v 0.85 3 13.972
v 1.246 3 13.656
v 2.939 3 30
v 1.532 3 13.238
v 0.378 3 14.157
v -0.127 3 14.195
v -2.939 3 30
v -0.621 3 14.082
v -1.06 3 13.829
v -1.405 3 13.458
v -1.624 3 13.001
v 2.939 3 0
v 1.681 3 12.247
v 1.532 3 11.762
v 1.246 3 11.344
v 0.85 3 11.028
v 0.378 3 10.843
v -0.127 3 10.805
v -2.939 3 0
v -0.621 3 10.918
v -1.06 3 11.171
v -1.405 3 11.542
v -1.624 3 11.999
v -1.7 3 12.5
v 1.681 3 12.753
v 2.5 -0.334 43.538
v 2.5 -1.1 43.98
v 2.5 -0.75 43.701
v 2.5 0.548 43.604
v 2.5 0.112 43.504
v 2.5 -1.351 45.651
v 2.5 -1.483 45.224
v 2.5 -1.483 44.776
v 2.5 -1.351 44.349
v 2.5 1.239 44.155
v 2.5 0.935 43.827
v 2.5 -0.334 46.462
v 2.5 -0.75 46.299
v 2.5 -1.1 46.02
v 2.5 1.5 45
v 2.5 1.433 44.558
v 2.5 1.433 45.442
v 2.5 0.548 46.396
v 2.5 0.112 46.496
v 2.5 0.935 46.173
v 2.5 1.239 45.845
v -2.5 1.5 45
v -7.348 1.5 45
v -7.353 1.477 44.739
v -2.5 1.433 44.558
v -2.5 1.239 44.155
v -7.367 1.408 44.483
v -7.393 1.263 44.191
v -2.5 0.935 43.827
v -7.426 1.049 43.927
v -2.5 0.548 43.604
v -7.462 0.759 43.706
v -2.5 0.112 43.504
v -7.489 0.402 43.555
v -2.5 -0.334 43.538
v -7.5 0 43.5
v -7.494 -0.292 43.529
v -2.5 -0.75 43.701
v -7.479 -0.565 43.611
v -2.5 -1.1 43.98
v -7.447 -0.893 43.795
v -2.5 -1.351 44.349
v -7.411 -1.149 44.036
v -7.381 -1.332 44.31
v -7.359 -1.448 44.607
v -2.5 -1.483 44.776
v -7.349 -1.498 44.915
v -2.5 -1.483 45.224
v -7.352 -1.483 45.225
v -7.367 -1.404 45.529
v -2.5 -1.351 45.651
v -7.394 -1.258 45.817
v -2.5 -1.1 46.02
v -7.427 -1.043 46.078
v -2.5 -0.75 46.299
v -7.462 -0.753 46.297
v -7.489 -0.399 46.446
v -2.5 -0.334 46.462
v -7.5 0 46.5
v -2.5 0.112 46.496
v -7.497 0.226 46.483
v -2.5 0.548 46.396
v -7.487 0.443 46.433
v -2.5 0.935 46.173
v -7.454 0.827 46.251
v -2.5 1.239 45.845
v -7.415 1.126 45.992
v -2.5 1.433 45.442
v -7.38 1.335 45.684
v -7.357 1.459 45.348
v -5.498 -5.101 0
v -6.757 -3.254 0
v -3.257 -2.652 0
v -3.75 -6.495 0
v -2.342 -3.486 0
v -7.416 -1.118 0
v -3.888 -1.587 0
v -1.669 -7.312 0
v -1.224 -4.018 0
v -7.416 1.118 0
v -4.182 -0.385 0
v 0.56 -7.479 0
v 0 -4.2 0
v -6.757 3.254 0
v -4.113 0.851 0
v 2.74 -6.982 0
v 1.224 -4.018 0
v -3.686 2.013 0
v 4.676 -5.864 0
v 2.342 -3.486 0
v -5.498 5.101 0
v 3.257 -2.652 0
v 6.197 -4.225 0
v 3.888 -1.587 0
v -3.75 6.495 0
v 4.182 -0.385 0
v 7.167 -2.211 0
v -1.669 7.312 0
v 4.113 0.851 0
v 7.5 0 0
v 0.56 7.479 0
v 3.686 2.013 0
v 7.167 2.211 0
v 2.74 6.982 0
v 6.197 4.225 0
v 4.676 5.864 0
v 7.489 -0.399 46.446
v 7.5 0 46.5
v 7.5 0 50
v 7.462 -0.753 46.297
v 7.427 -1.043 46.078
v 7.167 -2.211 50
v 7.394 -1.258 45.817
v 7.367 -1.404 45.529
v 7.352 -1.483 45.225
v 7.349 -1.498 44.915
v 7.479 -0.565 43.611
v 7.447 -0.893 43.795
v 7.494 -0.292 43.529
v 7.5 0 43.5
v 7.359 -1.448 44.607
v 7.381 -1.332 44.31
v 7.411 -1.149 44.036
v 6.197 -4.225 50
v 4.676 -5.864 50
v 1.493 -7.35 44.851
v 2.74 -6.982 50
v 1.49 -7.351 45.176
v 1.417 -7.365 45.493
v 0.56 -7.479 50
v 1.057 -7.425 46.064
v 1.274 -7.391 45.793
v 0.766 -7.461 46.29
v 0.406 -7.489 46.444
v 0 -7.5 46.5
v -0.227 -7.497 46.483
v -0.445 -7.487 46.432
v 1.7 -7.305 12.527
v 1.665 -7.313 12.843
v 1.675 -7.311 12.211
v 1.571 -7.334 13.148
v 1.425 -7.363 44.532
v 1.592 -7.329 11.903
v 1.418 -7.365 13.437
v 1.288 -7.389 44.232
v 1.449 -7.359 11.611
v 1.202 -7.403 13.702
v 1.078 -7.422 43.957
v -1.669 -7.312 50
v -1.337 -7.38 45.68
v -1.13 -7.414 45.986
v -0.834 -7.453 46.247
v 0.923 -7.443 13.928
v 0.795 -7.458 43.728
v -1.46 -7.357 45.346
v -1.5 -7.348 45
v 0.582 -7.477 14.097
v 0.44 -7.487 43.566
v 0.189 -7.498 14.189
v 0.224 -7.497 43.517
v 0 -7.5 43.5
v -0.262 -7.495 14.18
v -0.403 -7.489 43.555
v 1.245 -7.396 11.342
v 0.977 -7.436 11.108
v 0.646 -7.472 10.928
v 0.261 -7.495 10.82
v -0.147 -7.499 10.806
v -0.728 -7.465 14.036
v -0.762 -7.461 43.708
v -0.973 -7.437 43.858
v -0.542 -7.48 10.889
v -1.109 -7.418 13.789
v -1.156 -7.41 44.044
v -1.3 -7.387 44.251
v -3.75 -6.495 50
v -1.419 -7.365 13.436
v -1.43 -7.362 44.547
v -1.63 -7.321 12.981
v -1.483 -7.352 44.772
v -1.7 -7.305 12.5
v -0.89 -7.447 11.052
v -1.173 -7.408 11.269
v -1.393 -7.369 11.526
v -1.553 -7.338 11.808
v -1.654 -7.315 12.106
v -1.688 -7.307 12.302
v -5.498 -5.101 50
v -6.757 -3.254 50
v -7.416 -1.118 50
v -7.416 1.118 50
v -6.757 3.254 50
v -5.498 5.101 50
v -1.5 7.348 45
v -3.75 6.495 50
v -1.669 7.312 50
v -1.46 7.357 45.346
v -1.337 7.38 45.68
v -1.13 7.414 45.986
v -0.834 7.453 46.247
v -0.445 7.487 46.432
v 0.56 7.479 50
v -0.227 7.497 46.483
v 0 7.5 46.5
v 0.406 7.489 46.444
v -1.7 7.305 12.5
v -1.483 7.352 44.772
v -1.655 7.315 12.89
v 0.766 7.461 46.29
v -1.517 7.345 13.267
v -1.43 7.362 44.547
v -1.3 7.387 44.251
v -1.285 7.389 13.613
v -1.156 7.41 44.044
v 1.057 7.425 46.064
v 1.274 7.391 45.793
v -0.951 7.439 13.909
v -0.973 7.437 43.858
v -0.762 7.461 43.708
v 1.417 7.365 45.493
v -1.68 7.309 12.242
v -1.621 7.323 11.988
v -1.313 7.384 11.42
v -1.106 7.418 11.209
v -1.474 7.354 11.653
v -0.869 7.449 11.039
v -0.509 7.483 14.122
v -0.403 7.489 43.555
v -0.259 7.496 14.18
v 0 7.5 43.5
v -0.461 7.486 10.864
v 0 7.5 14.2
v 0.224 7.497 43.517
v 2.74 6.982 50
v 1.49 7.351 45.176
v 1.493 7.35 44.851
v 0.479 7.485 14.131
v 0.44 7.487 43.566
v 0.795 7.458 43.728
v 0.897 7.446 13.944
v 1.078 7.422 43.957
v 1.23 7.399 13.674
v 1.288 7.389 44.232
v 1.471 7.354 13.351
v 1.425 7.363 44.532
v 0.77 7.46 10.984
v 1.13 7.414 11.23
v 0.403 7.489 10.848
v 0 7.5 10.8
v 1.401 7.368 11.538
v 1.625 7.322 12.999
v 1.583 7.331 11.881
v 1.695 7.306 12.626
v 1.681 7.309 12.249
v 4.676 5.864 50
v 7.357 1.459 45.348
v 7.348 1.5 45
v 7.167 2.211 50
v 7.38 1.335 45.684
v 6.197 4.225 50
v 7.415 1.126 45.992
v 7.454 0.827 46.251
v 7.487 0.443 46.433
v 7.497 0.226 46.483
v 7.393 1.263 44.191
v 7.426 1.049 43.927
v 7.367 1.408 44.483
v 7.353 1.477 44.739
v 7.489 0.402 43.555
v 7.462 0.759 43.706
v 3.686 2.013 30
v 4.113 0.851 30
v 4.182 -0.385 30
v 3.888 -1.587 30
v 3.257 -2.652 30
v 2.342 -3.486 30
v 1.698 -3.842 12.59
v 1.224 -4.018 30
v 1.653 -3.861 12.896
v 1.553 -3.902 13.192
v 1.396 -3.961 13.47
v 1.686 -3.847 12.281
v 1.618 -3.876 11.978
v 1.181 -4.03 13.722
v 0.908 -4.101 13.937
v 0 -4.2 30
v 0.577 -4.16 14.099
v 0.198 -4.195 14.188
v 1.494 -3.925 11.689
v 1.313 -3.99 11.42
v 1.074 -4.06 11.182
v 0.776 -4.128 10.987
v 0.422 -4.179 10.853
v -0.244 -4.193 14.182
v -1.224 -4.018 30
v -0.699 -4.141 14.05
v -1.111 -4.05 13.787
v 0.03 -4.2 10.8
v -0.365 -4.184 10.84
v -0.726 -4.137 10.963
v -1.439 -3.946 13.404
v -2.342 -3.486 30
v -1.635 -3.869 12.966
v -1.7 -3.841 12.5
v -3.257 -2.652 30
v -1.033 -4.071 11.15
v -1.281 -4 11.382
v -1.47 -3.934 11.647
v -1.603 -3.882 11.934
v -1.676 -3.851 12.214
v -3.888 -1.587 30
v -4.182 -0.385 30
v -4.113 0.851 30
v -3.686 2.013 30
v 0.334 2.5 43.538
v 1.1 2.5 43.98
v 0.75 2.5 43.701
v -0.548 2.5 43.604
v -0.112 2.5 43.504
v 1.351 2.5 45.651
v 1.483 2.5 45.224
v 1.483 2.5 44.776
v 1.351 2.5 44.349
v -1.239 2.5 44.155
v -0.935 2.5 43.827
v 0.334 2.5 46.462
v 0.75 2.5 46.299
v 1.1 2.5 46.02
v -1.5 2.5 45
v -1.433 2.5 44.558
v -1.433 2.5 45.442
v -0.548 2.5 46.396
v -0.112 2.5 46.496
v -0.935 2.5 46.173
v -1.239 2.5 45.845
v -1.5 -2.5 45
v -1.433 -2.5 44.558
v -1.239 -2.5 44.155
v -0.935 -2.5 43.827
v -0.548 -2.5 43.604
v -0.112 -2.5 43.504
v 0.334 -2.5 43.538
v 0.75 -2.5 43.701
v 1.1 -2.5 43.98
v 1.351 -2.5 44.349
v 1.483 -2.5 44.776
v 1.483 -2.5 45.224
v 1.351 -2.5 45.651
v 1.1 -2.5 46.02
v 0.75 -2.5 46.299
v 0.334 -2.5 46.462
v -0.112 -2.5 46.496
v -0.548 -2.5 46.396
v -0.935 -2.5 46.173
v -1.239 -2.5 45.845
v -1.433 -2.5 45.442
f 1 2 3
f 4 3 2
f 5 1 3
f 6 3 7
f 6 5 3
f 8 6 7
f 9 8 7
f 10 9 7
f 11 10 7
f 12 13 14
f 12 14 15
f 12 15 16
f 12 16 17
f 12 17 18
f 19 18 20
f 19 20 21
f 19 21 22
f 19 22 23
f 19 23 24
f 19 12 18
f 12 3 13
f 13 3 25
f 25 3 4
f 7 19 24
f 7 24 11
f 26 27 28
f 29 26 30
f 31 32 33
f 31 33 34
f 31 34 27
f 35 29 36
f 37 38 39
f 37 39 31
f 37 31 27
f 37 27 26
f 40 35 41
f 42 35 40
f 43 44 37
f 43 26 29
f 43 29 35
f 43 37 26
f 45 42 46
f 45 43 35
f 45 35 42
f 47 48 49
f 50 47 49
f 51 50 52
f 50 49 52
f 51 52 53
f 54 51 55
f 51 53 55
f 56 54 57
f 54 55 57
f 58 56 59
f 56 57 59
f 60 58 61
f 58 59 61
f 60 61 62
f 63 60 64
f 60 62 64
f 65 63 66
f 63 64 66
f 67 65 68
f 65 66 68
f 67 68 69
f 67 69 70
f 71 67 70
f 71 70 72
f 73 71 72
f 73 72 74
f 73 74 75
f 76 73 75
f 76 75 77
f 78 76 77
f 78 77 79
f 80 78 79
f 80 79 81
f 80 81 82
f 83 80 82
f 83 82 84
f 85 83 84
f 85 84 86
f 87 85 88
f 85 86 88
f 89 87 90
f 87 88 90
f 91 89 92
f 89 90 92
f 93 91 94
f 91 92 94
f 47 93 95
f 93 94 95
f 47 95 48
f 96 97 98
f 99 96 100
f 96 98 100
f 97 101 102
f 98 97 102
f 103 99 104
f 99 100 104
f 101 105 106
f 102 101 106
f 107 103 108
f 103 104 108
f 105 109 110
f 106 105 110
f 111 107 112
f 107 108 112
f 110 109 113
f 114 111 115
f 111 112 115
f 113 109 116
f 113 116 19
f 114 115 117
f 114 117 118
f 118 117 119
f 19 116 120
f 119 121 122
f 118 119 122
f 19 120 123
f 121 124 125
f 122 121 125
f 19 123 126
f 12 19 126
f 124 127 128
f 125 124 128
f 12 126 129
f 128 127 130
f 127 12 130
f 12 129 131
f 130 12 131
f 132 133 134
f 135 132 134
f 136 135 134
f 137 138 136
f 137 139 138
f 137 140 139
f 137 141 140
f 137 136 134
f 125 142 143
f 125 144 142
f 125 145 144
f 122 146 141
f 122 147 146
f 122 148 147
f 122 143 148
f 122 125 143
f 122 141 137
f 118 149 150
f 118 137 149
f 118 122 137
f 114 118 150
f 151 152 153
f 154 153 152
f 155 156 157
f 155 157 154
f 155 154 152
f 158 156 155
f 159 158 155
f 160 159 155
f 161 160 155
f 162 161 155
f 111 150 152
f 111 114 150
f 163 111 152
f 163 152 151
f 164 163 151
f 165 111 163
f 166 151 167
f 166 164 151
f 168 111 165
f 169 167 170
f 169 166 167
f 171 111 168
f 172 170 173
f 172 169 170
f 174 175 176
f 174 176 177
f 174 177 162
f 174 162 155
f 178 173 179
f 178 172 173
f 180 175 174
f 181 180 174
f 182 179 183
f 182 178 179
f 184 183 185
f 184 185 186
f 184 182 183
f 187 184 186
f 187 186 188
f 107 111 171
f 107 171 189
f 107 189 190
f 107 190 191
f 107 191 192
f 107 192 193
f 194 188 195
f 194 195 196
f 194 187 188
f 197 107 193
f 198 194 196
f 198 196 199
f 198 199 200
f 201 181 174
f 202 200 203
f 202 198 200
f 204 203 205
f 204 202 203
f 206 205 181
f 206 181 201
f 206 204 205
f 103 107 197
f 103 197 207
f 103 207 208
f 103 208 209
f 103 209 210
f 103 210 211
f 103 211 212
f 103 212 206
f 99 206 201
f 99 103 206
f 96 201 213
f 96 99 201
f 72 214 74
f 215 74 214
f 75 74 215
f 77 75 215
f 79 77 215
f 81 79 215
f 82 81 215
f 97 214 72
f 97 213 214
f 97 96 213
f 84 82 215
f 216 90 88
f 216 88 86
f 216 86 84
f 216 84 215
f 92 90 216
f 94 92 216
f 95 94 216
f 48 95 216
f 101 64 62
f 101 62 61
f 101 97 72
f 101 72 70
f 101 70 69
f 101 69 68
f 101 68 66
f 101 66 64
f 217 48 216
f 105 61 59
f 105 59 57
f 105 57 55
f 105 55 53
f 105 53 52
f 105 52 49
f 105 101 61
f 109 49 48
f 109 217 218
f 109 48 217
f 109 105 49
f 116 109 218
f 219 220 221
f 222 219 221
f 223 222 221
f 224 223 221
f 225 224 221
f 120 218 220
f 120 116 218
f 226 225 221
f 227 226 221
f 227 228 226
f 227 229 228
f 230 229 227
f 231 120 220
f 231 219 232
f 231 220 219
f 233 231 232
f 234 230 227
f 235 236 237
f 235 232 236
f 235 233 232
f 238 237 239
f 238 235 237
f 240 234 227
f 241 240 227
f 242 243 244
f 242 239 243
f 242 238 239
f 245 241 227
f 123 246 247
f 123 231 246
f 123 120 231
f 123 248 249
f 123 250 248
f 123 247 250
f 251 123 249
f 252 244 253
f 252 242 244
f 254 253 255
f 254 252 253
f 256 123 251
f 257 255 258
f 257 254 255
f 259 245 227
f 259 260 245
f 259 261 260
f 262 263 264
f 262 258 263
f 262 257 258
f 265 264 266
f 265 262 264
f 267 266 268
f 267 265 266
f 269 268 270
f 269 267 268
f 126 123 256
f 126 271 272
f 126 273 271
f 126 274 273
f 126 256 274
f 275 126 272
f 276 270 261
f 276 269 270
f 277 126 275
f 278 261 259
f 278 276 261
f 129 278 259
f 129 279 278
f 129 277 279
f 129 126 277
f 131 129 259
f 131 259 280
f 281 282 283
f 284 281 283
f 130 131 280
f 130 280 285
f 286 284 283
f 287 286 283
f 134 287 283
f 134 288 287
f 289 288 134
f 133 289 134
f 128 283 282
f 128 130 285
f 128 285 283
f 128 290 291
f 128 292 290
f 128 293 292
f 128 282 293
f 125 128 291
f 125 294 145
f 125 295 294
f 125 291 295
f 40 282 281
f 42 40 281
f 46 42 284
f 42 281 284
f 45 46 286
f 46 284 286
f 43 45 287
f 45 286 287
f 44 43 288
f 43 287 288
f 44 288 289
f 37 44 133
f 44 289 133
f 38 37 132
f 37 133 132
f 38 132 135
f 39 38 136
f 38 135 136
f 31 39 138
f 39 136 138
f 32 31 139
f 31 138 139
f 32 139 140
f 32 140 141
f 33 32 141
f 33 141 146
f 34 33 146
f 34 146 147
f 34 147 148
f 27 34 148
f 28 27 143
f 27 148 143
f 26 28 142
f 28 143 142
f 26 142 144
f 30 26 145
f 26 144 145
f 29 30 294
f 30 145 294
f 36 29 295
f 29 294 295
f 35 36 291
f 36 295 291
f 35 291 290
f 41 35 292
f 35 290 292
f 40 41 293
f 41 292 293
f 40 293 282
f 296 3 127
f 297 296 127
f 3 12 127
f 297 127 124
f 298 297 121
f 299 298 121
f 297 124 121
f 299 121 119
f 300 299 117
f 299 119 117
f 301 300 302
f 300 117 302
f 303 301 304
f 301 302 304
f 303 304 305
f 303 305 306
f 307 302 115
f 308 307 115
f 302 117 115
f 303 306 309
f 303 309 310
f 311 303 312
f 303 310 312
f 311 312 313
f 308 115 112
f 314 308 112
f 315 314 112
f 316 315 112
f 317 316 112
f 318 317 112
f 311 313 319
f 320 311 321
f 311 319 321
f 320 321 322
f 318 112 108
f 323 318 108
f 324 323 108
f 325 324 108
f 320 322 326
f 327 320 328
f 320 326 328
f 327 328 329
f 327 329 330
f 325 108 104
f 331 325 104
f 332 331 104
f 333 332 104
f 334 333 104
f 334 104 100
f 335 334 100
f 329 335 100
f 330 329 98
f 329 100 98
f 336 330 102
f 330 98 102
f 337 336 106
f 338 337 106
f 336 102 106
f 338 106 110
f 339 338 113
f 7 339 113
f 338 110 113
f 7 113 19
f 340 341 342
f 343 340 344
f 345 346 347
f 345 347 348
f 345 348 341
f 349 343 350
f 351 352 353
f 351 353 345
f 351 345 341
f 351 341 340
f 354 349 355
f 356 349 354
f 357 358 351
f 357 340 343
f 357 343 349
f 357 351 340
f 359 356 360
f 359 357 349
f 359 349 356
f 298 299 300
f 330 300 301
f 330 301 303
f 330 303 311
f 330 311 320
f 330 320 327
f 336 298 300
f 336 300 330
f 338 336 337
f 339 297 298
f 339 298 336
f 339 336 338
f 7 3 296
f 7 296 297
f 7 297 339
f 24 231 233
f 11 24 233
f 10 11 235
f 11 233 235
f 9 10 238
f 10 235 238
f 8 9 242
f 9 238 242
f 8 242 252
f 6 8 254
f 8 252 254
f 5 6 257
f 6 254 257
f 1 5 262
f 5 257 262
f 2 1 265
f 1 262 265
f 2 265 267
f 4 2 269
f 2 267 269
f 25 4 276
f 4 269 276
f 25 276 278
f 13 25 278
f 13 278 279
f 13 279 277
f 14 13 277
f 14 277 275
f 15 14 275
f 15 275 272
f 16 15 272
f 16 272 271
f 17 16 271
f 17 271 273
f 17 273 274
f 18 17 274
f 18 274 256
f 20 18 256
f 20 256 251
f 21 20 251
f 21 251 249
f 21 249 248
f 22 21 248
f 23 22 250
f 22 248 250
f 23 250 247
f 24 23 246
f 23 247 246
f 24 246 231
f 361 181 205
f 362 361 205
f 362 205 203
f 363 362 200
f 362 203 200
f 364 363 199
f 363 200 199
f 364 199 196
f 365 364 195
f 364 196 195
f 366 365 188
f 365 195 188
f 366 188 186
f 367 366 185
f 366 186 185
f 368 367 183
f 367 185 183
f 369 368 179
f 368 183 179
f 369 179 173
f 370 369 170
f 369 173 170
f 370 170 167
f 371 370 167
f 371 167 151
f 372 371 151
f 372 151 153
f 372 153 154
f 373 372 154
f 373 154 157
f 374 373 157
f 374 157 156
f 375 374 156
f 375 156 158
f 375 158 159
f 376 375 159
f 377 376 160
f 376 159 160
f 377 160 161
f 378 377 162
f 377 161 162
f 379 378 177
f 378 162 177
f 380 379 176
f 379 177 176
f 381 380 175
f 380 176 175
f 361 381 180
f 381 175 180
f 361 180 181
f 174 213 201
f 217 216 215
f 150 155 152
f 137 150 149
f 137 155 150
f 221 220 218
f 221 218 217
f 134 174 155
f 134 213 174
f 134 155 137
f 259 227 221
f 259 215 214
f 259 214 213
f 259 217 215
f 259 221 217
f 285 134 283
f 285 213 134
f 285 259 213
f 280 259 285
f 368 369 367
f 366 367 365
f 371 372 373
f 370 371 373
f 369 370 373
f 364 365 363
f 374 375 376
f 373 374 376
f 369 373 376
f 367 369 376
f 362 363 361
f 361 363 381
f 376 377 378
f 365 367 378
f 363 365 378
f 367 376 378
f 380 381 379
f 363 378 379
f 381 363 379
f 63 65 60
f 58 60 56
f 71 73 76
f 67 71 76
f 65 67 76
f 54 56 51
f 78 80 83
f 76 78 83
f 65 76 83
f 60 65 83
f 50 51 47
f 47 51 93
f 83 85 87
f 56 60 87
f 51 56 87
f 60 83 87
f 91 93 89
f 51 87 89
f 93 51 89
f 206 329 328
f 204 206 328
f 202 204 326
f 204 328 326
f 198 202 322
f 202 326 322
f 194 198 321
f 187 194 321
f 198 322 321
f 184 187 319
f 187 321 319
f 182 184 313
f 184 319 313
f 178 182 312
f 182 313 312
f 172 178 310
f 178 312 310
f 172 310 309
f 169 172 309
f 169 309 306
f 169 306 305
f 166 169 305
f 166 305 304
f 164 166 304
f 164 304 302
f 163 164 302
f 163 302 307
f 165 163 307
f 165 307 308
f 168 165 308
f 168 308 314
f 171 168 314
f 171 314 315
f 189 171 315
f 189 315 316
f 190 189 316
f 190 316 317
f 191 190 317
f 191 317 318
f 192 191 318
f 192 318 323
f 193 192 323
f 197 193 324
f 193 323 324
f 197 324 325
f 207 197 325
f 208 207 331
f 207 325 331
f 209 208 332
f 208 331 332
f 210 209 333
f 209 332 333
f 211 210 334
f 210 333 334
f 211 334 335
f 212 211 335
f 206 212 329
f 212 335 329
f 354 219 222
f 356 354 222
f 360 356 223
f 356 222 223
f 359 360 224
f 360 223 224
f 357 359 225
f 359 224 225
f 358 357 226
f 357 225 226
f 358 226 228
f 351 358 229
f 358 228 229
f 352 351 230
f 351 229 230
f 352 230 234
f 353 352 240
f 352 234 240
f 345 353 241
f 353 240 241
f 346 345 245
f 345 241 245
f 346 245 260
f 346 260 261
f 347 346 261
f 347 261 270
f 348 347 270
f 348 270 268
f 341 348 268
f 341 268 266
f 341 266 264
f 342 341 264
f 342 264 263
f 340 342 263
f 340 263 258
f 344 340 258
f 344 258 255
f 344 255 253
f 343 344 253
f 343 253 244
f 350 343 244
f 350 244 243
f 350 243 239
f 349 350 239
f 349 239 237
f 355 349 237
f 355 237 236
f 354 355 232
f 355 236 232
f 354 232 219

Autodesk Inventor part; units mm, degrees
sketch "スケッチ1" plane through (0, 0, 0) normal (0, 0, 1) x (1, 0, 0)
  circle A0 centre (0, 0) radius 7.5
  dimension "d0" = 15
extrude "押し出し1" add sketch "スケッチ1" along normal blind 50
sketch "スケッチ2" plane through (0, 0, 0) normal (0, 0, -1) x (-1, 0, 0)
  arc A0 (-2.9394, 3) -> (2.9394, 3) centre (0, 0) ccw
  line L0 (-2.9394, 3) -> (2.9394, 3)
  point P0 (-3.1305, 2.8)
  dimension "d3" = 4.2
  dimension "d4" = 3
extrude "押し出し2" cut sketch "スケッチ2" against normal blind 30
ref_plane "作業平面1" through (7.5, 0, 0) normal (1, 0, 0) x (0, 1, 0)
ref_plane "作業平面2" through (-7.5, 0, 0) normal (1, 0, 0) x (0, 1, 0)
ref_plane "作業平面3" through (0, 7.5, 0) normal (0, 1, 0) x (-1, 0, 0)
ref_plane "作業平面4" through (0, -7.5, 0) normal (0, 1, 0) x (-1, 0, 0)
sketch "スケッチ3" plane through (7.5, 0, 0) normal (1, 0, 0) x (0, 1, 0)
  circle A0 centre (0, 45) radius 1.5
  line L0 (7.5, 50) -> (-7.5, 50) projected
  point P0 (0, 0)
  dimension "d11" = 3
  dimension "d12" = 5
sketch "スケッチ4" plane through (-7.5, 0, 0) normal (1, 0, 0) x (0, 1, 0)
  circle A0 centre (0, 45) radius 1.5
  line L0 (7.5, 50) -> (-7.5, 50) projected
  point P0 (0, 0)
  dimension "d13" = 3
  dimension "d14" = 5
extrude "押し出し3" cut sketch "スケッチ3" against normal blind 5
extrude "押し出し4" cut sketch "スケッチ4" along normal blind 5
sketch "スケッチ5" plane through (0, 7.5, 0) normal (0, 1, 0) x (-1, 0, 0)
  circle A0 centre (0, 45) radius 1.5
  line L0 (7.5, 50) -> (-7.5, 50) projected
  point P0 (0, 0)
  dimension "d19" = 3
  dimension "d20" = 5
sketch "スケッチ6" plane through (0, -7.5, 0) normal (0, 1, 0) x (-1, 0, 0)
  circle A0 centre (0, 45) radius 1.5
  line L0 (7.5, 50) -> (-7.5, 50) projected
  point P0 (0, 0)
  dimension "d21" = 3
  dimension "d22" = 5
extrude "押し出し5" cut sketch "スケッチ5" against normal blind 5
extrude "押し出し6" cut sketch "スケッチ6" along normal blind 5
thread "ねじ1" size "M3x0.5" class "6H" standard "ANSI Metric M Profile" full length
thread "ねじ2" size "M3x0.5" class "6H" standard "ANSI Metric M Profile" full length
thread "ねじ3" size "M3x0.5" class "6H" standard "ANSI Metric M Profile" full length
thread "ねじ4" size "M3x0.5" class "6H" standard "ANSI Metric M Profile" full length
sketch "スケッチ7" plane through (0, 7.5, 0) normal (0, 1, 0) x (-1, 0, 0)
  circle A0 centre (0, 12.5) radius 1.7
  point P0 (0, 0)
  dimension "d35" = 3.4
  dimension "d36" = 12.5
extrude "押し出し7" cut sketch "スケッチ7" against normal through all
properties part number "rotary_transfer_shaft_5" material "ステンレス鋼"
